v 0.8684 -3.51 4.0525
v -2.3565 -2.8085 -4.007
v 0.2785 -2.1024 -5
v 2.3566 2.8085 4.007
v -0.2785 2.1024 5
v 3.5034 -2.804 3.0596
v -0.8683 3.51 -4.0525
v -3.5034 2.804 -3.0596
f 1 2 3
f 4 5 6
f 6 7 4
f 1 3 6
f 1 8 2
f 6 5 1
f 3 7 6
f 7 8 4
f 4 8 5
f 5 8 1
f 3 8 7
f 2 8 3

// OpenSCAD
intersection() {
translate([-4.204082, -4.211999, -6.000000])
cube(size = [8.408184, 8.423988, 12.000000], center = false);
union() {
// Begin.
union() {
rotate([100, 20.0001, 15])
translate([1.00136e-05, 5.00679e-06, 5.00679e-06])
cube(size = [2.90309, 8.70911, 5.80626], center = true);

rotate([100, 20.0001, 15])
translate([1.00136e-05, 5.00679e-06, 5.00679e-06])
cube(size = [2.90309, 8.70911, 5.80626], center = true);
}
// End.
}
}
